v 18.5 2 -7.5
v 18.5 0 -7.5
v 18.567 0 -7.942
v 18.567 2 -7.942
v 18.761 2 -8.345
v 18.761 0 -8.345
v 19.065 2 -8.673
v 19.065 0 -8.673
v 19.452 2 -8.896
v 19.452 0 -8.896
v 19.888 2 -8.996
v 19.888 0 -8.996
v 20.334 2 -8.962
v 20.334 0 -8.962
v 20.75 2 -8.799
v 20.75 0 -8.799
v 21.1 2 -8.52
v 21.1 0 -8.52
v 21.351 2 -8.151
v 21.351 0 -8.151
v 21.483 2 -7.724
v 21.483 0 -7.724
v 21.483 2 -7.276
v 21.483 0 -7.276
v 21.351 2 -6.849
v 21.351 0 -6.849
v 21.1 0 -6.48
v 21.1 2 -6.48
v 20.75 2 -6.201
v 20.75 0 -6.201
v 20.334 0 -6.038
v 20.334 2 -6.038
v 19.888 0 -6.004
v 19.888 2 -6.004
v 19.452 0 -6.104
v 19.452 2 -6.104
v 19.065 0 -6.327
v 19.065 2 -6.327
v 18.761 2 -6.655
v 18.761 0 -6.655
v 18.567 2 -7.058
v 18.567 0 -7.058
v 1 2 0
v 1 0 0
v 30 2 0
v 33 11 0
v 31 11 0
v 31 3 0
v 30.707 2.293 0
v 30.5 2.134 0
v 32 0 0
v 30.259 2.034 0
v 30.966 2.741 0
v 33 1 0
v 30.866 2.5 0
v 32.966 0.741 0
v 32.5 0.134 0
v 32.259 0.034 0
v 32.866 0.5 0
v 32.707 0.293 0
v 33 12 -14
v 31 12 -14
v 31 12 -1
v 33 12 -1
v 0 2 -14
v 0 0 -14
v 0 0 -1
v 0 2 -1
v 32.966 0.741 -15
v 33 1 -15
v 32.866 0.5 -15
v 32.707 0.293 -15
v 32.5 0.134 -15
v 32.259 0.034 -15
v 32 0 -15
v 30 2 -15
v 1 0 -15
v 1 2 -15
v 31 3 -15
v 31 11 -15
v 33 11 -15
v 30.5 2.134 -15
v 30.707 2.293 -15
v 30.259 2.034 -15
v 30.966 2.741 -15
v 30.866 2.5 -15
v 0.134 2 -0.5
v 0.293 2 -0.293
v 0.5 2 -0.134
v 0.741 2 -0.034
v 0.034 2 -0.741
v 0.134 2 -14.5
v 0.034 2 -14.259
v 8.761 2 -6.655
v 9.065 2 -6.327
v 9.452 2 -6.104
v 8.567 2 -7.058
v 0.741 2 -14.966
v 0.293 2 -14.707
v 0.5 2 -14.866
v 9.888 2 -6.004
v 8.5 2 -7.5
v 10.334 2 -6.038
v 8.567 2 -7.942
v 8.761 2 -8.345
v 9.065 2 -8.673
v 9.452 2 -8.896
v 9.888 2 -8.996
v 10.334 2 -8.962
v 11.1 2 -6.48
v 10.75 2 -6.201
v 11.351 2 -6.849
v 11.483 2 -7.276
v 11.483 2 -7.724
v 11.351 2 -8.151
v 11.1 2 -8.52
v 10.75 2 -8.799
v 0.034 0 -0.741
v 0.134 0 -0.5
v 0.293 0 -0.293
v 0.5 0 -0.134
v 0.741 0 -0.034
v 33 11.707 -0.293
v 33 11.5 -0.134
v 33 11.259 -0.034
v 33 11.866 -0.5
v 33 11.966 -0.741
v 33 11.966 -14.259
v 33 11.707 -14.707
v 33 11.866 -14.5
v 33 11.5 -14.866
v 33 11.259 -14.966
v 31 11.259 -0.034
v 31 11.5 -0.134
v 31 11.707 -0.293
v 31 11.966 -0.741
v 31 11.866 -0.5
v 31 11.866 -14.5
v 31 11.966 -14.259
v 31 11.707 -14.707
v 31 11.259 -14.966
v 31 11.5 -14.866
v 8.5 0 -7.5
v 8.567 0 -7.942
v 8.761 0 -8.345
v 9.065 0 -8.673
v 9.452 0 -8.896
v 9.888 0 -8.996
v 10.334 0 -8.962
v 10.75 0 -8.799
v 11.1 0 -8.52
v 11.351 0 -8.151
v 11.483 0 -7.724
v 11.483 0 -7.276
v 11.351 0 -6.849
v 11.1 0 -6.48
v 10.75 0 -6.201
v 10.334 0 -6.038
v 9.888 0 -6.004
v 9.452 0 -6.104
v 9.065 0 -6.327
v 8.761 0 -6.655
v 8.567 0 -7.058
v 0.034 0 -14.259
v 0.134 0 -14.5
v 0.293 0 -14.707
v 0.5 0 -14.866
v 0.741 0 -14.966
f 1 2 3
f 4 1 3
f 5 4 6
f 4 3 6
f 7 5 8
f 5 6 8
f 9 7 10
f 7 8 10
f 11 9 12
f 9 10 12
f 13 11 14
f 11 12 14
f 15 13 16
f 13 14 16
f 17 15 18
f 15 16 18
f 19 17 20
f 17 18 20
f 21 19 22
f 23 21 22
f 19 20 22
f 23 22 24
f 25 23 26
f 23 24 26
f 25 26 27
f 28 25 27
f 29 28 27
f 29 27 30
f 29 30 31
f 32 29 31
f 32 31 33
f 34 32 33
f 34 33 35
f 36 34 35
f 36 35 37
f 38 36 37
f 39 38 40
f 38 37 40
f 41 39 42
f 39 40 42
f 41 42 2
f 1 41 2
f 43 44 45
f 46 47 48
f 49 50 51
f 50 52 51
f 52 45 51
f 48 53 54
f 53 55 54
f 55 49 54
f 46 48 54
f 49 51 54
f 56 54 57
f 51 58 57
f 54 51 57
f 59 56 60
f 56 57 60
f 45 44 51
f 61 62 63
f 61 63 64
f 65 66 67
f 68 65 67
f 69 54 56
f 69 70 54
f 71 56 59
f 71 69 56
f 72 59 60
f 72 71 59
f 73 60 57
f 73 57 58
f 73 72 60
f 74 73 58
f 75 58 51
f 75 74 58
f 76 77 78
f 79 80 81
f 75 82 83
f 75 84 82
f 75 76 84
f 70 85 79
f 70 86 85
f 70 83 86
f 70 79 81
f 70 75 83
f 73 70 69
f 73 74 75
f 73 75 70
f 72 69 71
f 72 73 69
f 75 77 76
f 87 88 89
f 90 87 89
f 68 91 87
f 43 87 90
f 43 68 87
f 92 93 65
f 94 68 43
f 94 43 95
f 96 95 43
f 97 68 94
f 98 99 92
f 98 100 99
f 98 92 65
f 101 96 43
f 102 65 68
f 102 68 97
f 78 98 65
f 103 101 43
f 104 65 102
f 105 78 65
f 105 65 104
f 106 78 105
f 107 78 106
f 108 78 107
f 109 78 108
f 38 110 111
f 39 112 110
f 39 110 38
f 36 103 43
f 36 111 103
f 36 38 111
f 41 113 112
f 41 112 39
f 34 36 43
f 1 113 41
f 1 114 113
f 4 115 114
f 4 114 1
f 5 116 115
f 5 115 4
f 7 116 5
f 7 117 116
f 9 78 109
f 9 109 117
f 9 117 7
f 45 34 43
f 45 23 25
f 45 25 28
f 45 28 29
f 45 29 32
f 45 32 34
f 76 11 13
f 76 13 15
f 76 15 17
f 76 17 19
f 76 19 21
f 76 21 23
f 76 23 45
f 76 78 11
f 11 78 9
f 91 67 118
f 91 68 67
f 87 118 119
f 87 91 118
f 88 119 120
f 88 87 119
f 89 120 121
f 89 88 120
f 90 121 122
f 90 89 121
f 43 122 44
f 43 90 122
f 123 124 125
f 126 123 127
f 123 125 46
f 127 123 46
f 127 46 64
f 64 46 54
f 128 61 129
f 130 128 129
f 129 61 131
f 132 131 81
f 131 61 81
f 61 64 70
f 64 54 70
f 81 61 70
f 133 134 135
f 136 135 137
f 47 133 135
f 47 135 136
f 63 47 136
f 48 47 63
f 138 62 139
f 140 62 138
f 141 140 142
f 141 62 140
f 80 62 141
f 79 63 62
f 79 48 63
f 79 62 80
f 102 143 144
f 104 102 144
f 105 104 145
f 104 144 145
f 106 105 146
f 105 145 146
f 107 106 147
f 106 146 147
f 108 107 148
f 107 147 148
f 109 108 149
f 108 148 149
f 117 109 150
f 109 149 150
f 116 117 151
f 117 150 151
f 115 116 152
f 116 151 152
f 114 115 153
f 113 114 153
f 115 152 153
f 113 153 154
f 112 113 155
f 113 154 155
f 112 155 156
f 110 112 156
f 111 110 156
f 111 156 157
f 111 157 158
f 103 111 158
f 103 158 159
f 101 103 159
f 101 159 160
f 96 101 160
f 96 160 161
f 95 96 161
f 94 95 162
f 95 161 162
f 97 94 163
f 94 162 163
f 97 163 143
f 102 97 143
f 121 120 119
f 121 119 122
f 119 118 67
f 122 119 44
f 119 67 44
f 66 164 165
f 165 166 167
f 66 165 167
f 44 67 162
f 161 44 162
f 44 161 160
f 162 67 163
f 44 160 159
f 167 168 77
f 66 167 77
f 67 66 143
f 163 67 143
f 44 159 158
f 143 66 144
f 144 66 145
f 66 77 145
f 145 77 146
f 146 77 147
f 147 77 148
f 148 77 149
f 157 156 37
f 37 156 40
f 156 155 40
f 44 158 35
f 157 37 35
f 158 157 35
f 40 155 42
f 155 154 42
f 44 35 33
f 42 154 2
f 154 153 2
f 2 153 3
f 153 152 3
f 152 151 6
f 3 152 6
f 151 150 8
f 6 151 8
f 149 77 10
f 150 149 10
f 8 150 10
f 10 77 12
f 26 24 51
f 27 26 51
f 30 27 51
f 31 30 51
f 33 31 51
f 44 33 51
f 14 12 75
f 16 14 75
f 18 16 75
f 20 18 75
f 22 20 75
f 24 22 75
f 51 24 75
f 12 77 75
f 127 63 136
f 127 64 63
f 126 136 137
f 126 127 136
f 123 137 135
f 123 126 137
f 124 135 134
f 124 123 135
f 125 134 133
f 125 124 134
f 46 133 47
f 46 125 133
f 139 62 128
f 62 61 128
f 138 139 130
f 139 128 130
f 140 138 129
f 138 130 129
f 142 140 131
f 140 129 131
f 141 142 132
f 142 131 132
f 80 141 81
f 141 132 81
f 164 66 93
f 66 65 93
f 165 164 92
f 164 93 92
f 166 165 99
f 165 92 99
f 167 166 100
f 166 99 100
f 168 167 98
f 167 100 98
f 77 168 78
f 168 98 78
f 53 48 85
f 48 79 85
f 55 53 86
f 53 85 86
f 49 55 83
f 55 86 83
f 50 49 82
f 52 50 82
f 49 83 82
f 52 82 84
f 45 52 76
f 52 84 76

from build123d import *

# Parameters (mm, degrees)
BOSS_EXTRUDE1_DEPTH = 2
SKETCH2_W           = 2
SKETCH2_H           = 15
BOSS_EXTRUDE2_DEPTH = 10
FILLET1_R           = 1
FILLET2_R           = 1


with BuildPart() as part:
    # Sketch1 → Boss-Extrude1 (new body)
    with BuildSketch(Plane(origin=(0, 0, 0), x_dir=(1, 0, 0), z_dir=(0, 1, 0))):
        with BuildLine():
            Line((33, 7.5), (21.5, 7.5))
            ThreePointArc((21.5, 7.5), (20, 6), (18.5, 7.5))
            Line((18.5, 7.5), (11.5, 7.5))
            ThreePointArc((11.5, 7.5), (10, 6), (8.5, 7.5))
            Line((8.5, 7.5), (0, 7.5))
            Line((0, 7.5), (0, 0))
            Line((0, 0), (33, 0))
            Line((33, 0), (33, 7.5))
        make_face()
        with BuildLine():
            ThreePointArc((18.5, 7.5), (20, 9), (21.5, 7.5))
            Line((21.5, 7.5), (33, 7.5))
            Line((33, 7.5), (33, 15))
            Line((33, 15), (0, 15))
            Line((0, 15), (0, 7.5))
            Line((0, 7.5), (8.5, 7.5))
            ThreePointArc((8.5, 7.5), (10, 9), (11.5, 7.5))
            Line((11.5, 7.5), (18.5, 7.5))
        make_face()
    extrude(amount=BOSS_EXTRUDE1_DEPTH)

    # Sketch2 → Boss-Extrude2 (add)
    with BuildSketch(Plane(origin=(0, 2, 0), x_dir=(1, 0, 0), z_dir=(0, 1, 0))):
        with Locations((32, 7.5)):
            Rectangle(SKETCH2_W, SKETCH2_H)
    extrude(amount=BOSS_EXTRUDE2_DEPTH)

    # Fillet1
    fillet1_edges = [part.edges().sort_by_distance(p)[0] for p in [
        (0, 1, 0),
        (0, 1, -15),
        (31, 2, -7.5),
        (32, 12, -15),
        (32, 12, 0),
    ]]
    fillet(fillet1_edges, radius=FILLET1_R)

    # Fillet2
    fillet2_edges = [part.edges().sort_by_distance(p)[0] for p in [
        (33, 0, -7.5),
    ]]
    fillet(fillet2_edges, radius=FILLET2_R)


solid = part.part
